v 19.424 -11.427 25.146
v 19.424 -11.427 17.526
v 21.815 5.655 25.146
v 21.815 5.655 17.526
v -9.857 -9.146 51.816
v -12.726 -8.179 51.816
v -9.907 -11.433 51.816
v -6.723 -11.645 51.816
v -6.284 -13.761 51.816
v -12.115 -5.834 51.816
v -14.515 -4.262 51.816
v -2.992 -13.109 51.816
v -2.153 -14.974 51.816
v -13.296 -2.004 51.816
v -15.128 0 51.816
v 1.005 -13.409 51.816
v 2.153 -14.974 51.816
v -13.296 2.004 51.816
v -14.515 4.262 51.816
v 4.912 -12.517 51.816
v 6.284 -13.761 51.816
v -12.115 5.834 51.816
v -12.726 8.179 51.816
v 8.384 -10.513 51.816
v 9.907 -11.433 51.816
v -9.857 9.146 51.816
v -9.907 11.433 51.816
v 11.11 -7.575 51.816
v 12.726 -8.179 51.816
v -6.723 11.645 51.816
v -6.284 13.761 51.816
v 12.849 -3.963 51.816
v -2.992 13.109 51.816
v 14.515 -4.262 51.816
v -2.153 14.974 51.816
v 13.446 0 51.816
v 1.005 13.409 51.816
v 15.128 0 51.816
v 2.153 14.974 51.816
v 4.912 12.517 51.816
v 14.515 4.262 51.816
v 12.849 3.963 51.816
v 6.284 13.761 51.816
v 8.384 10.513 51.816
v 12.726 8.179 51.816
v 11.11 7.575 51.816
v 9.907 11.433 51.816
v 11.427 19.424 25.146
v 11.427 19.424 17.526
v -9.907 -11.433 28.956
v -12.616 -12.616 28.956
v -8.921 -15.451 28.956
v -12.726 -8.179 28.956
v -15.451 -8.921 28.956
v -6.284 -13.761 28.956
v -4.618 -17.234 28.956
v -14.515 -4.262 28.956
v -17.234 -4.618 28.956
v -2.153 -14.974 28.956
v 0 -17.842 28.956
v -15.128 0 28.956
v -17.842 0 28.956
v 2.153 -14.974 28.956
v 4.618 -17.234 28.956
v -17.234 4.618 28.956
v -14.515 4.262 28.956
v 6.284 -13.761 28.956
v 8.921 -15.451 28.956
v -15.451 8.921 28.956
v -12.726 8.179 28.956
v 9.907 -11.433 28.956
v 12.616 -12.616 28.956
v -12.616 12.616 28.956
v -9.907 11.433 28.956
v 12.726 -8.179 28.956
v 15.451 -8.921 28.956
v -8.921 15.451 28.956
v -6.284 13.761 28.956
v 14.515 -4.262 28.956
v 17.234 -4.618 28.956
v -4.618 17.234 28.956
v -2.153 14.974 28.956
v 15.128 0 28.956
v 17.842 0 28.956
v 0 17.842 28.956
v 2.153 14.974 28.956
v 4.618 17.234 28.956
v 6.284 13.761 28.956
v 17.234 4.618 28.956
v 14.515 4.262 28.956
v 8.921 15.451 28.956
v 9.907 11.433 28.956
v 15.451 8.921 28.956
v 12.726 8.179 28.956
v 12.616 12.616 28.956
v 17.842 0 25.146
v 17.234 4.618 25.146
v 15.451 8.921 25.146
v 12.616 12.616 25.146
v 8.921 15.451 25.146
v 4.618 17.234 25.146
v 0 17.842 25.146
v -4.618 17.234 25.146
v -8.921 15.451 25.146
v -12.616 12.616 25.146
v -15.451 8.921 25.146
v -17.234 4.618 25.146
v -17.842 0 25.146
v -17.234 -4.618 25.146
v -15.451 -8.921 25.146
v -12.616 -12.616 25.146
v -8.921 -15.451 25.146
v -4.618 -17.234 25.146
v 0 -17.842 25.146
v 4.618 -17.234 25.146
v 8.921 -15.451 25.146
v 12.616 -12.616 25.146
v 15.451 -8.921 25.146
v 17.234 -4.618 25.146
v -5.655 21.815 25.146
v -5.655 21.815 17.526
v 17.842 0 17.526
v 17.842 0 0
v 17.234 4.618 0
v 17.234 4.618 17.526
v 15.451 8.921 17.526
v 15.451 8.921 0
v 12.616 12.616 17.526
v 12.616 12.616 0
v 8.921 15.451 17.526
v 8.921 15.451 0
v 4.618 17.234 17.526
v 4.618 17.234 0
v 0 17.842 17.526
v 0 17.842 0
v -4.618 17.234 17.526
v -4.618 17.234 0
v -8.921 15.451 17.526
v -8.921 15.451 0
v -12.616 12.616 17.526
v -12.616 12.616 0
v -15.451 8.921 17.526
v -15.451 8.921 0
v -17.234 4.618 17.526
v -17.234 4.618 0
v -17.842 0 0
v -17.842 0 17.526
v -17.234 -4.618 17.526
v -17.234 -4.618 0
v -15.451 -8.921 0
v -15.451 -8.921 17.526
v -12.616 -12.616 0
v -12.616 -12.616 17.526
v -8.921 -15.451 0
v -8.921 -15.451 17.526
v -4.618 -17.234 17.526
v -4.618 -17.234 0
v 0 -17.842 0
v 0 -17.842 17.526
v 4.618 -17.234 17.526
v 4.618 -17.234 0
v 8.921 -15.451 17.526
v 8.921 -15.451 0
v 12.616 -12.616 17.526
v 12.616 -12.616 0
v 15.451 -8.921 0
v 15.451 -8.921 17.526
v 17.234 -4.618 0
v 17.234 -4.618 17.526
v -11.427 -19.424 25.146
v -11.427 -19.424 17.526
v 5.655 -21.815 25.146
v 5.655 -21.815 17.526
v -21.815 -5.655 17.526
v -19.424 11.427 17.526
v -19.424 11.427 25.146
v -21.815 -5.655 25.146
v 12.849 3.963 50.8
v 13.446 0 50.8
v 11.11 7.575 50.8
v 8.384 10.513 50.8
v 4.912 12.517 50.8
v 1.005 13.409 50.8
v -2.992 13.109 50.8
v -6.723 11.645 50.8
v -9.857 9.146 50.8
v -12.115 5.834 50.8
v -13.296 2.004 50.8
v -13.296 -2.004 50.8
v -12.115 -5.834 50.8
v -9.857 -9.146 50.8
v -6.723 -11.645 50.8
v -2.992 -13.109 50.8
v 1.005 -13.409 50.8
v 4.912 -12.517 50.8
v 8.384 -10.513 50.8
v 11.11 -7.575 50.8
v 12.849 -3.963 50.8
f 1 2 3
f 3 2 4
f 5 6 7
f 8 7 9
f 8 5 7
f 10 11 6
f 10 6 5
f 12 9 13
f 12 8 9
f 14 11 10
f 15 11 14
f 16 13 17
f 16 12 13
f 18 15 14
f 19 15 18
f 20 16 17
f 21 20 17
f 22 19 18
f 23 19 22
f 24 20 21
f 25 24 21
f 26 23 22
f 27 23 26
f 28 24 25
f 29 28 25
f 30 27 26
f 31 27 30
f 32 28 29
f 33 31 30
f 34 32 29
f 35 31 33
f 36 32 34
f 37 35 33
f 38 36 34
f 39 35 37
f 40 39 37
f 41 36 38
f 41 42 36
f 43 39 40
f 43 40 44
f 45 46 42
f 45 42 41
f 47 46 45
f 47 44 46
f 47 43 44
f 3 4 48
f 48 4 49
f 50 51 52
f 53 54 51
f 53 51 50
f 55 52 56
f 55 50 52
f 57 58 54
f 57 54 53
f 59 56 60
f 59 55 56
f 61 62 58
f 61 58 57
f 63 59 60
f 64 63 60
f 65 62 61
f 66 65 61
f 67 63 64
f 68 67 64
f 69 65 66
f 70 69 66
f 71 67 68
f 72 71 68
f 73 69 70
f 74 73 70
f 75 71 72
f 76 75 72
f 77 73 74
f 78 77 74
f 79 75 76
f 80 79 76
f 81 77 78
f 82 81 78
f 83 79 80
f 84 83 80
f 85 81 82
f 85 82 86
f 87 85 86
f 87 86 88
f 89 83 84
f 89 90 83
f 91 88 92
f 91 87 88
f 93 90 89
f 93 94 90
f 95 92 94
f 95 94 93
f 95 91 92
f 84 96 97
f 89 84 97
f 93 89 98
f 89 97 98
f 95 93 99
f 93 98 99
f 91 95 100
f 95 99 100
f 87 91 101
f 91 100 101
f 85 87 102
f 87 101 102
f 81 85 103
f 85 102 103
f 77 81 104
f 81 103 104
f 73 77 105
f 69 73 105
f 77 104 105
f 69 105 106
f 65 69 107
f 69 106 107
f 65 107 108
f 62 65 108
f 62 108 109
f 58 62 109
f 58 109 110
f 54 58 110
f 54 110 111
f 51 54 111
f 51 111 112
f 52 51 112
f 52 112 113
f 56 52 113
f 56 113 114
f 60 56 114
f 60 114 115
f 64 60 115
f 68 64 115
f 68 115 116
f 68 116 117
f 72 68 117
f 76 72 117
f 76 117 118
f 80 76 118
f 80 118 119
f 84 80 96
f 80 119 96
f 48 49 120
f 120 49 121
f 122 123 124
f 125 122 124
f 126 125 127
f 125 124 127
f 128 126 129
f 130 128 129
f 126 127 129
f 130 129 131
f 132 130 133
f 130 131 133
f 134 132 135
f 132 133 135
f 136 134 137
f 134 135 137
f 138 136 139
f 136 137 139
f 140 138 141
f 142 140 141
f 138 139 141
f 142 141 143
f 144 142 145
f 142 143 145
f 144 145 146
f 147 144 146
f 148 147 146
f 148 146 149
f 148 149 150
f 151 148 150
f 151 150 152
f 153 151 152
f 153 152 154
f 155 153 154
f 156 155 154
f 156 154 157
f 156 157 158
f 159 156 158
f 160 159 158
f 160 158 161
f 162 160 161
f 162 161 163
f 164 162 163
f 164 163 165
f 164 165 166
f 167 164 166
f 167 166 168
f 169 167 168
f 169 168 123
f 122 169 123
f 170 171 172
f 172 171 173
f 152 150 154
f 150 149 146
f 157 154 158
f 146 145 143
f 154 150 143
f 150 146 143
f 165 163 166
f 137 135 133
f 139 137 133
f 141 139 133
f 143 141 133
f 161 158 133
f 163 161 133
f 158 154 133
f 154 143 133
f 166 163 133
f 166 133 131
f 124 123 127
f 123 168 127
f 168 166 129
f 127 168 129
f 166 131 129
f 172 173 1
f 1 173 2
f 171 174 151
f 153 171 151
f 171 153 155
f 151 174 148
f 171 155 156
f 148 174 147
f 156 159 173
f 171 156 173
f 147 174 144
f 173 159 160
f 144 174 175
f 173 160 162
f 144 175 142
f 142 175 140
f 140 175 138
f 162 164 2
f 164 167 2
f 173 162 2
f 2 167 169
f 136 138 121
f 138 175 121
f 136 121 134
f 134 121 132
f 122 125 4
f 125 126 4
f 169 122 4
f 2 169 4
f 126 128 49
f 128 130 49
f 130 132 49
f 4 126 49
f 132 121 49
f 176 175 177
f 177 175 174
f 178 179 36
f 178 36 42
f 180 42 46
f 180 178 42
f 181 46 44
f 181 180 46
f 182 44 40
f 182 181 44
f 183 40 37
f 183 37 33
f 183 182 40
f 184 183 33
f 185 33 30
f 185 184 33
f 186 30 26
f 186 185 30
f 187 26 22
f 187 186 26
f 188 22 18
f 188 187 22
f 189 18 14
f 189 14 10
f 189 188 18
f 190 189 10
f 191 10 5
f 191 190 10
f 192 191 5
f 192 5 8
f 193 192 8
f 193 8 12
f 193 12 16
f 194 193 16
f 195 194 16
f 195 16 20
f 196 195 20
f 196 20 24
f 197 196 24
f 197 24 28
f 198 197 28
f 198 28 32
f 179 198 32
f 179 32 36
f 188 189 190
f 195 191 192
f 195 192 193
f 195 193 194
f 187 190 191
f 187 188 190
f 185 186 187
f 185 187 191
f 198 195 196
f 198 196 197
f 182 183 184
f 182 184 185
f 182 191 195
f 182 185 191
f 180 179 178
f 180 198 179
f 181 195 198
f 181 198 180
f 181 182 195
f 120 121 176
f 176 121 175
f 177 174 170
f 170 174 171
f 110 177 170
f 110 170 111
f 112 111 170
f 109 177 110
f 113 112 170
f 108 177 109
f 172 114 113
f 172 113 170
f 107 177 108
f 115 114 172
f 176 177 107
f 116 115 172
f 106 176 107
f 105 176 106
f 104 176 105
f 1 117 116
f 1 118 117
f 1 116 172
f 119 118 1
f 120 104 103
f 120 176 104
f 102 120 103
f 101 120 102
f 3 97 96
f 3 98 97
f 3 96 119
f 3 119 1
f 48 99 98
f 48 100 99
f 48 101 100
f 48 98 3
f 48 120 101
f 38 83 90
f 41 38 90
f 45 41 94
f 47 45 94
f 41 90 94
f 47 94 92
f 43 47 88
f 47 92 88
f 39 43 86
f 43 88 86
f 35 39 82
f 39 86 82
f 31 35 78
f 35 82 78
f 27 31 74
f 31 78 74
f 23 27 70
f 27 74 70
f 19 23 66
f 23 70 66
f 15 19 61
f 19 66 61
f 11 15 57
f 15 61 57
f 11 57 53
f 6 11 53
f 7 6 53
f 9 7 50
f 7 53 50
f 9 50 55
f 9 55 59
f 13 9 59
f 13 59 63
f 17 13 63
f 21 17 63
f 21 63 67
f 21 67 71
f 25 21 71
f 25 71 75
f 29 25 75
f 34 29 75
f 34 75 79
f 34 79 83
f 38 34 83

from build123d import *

# Parameters (mm, degrees)
F0_R     = 13.4462075072
F1_DEPTH = 50.8
F0_R_2   = 15.1279388752
F2_DEPTH = 51.816
F0_R_3   = 17.8416483947
F3_DEPTH = 28.956
F4_START = 17.526
F4_DEPTH = 7.62


with BuildPart() as f1:
    # F0 (on Top) → F1 (new body)
    with BuildSketch(Plane.XY):
        Circle(F0_R)
    extrude(amount=F1_DEPTH)

    # F0 (on Top) → F2 (join)
    with BuildSketch(Plane.XY):
        Circle(F0_R_2)
        Circle(F0_R, mode=Mode.SUBTRACT)
    extrude(amount=F2_DEPTH)

    # F0 (on Top) → F3 (join)
    with BuildSketch(Plane.XY):
        Circle(F0_R_3)
        Circle(F0_R_2, mode=Mode.SUBTRACT)
    extrude(amount=F3_DEPTH)

    # F0 (on Top) → F4 (join)
    with BuildSketch(Plane.XY.offset(F4_START)):
        Polygon((21.8152726681, 5.6546813213), (11.4272637293, 19.4241907448), (-5.6546813213, 21.8152726681), (-19.4241907448, 11.4272637293), (-21.8152726681, -5.6546813213), (-11.4272637293, -19.4241907448), (5.6546813213, -21.8152726681), (19.4241907448, -11.4272637293), align=None)
        Circle(F0_R_3, mode=Mode.SUBTRACT)
    extrude(amount=F4_DEPTH)


solid = f1.part
